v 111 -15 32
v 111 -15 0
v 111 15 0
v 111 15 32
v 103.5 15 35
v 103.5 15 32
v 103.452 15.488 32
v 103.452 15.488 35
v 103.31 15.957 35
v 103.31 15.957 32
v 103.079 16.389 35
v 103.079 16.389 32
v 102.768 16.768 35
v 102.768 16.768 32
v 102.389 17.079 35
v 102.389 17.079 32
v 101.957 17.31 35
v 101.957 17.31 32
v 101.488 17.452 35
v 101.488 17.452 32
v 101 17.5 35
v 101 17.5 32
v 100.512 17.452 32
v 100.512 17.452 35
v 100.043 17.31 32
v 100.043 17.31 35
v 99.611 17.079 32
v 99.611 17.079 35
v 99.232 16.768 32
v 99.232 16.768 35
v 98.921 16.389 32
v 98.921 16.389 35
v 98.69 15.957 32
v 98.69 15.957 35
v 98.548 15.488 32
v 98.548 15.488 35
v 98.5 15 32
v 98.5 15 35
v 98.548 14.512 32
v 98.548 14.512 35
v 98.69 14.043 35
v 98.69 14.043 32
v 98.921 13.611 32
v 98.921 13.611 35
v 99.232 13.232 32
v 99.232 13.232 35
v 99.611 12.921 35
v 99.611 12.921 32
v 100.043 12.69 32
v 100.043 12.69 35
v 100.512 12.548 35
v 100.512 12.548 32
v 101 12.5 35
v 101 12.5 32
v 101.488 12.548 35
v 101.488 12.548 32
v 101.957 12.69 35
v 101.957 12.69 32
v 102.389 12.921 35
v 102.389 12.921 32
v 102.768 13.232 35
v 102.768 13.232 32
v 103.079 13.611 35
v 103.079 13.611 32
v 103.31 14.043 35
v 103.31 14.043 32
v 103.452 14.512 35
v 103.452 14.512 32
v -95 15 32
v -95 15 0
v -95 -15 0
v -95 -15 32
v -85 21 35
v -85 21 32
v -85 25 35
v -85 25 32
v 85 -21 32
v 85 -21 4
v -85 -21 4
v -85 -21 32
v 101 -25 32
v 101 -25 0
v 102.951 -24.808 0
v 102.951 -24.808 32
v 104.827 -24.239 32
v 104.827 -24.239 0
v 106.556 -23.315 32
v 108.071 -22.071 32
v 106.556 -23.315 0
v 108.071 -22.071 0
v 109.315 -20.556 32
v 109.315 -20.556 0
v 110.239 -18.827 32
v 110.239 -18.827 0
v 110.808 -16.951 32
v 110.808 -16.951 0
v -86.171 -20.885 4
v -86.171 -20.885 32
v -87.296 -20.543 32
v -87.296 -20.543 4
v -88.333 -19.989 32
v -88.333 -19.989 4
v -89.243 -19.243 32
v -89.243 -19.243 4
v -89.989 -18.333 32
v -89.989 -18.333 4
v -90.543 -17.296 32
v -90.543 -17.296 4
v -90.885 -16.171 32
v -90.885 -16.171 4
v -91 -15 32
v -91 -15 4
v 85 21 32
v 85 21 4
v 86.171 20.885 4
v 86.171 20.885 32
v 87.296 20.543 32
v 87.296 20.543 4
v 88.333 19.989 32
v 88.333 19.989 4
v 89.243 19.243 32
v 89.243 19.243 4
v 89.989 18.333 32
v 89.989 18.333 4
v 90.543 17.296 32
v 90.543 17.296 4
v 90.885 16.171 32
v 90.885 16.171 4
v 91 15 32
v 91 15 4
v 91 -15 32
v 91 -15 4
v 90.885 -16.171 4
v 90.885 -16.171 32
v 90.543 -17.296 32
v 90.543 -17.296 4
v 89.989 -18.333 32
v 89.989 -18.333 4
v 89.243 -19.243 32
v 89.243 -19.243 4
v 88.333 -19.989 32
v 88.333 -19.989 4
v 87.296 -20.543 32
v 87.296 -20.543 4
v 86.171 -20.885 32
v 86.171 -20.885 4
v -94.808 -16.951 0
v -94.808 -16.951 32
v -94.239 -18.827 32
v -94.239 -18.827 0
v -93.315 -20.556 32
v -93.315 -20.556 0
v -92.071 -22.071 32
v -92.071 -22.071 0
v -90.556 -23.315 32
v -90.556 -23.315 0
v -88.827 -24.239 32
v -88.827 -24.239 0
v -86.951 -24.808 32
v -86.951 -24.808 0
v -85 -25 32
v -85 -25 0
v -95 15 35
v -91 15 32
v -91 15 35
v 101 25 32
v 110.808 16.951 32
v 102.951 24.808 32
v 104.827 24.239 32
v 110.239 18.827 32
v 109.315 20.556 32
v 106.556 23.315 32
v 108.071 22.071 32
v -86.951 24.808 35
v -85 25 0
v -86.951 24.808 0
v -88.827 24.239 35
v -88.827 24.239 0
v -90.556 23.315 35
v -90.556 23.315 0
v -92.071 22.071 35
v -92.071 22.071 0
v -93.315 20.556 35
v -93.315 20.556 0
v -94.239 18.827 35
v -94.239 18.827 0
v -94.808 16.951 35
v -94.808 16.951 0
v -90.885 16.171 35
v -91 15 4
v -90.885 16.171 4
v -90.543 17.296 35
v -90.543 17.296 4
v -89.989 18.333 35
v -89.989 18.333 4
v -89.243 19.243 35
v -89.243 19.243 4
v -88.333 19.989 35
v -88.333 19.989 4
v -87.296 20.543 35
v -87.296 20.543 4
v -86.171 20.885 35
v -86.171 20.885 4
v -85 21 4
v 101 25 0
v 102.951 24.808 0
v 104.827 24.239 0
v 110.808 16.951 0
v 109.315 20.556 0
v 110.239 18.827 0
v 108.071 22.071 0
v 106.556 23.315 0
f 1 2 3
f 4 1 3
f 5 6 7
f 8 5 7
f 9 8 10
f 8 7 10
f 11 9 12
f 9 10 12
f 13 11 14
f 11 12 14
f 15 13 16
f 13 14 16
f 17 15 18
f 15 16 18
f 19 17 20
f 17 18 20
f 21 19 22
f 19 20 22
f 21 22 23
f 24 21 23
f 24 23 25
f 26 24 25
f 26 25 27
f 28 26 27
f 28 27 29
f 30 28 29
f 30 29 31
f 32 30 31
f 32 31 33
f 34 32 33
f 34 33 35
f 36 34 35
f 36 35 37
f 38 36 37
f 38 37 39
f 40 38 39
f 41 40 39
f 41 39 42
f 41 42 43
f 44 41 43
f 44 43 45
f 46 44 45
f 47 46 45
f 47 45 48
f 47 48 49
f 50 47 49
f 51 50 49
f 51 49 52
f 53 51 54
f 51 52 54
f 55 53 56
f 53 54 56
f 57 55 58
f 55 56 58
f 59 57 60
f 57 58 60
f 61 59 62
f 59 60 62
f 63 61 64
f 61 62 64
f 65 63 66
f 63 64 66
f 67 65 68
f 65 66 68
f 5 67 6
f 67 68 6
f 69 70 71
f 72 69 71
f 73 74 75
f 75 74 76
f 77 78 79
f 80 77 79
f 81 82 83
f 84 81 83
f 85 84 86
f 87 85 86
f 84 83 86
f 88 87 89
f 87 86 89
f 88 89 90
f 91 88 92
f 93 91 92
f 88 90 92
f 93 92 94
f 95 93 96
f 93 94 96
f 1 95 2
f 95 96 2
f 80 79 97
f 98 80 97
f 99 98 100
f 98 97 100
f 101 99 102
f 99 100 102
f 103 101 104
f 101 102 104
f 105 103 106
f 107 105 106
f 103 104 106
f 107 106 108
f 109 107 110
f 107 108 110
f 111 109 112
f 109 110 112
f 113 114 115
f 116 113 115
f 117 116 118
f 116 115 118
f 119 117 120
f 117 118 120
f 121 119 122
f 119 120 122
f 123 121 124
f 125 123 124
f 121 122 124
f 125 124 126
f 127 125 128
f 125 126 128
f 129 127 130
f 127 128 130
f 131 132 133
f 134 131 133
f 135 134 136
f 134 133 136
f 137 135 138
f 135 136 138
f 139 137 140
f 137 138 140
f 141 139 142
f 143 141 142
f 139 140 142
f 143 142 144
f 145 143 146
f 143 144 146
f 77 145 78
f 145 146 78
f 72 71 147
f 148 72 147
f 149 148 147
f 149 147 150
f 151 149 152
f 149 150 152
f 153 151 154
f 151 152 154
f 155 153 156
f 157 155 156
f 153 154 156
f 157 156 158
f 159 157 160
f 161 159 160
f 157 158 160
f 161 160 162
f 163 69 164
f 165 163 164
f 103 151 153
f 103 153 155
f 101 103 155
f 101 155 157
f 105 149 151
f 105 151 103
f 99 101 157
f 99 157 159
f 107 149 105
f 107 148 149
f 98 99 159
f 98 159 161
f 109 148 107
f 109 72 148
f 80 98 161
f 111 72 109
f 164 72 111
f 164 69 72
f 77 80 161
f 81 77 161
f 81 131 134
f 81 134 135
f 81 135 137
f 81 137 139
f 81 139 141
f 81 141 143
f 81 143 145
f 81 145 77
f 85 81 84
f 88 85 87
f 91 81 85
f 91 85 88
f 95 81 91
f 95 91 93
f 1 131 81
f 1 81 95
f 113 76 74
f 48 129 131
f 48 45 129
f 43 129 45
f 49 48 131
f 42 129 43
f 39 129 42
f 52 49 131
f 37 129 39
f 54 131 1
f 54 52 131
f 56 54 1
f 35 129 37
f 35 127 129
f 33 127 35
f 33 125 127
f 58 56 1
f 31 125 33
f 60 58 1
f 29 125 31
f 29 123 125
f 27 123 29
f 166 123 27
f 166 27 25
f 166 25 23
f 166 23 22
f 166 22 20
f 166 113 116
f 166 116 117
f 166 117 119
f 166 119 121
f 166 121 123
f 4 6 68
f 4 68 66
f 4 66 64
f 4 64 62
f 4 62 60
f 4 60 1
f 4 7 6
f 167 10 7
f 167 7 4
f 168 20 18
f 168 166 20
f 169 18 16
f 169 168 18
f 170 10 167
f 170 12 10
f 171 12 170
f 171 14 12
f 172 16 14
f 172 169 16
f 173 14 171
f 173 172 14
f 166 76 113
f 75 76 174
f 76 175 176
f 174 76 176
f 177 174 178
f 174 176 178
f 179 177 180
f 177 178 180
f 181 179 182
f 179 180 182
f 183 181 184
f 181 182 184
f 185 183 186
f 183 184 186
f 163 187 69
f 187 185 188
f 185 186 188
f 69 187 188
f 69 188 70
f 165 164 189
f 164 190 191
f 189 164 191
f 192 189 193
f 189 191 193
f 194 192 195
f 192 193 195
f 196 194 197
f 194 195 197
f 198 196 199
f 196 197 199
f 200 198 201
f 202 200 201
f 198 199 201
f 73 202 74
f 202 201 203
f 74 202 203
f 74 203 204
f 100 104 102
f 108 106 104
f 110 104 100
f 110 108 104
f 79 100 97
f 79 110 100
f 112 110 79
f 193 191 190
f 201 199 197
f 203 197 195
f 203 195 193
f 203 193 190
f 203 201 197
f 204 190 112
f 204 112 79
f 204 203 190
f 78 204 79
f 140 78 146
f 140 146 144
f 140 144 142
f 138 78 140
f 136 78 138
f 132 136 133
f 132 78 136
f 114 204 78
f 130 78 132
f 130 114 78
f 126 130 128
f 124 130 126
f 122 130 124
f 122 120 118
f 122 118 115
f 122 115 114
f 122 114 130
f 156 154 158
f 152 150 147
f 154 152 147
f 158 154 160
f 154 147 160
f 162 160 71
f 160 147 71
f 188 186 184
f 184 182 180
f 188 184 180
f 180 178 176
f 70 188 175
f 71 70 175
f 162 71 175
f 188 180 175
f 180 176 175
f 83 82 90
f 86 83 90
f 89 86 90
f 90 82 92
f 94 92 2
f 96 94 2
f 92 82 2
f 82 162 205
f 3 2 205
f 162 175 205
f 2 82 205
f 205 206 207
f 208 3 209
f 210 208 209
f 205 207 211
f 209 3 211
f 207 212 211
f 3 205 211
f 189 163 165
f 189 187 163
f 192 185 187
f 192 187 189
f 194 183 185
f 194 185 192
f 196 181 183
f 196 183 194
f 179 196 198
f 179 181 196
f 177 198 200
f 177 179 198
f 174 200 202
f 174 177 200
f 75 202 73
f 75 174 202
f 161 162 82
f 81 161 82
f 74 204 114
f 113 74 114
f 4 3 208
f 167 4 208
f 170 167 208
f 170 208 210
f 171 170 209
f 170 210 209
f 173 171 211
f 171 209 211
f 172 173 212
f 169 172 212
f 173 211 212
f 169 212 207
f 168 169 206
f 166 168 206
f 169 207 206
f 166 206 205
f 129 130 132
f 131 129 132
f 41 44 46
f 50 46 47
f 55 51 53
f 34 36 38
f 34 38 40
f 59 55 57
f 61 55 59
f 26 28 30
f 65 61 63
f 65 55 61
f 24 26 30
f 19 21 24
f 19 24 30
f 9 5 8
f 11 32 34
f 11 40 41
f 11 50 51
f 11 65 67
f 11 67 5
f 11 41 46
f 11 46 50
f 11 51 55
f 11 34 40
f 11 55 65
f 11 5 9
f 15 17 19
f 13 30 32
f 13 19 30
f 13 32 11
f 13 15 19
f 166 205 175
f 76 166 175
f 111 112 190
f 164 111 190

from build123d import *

# Parameters (mm, degrees)
F0_R     = 2.5
F1_DEPTH = 32
F2_DEPTH = 35
F3_DEPTH = 4


with BuildPart() as f1:
    # F0 (on Top) → F1 (new body)
    with BuildSketch(Plane.XY):
        with BuildLine():
            Line((-95, 15), (-91, 15))
            ThreePointArc((-91, 15), (-89.242641, 19.242641), (-85, 21))
            Line((-85, 21), (-85, 25))
            ThreePointArc((-85, 25), (-92.071068, 22.071068), (-95, 15))
        make_face()
        with BuildLine():
            ThreePointArc((91, -15), (89.242641, -19.242641), (85, -21))
            Line((85, -21), (-85, -21))
            ThreePointArc((-85, -21), (-89.242641, -19.242641), (-91, -15))
            Line((-91, -15), (-91, 15))
            Line((-91, 15), (-95, 15))
            Line((-95, 15), (-95, -15))
            ThreePointArc((-95, -15), (-92.071068, -22.071068), (-85, -25))
            Line((-85, -25), (101, -25))
            ThreePointArc((101, -25), (108.071068, -22.071068), (111, -15))
            Line((111, -15), (111, 15))
            ThreePointArc((111, 15), (108.071068, 22.071068), (101, 25))
            Line((101, 25), (-85, 25))
            Line((-85, 25), (-85, 21))
            Line((-85, 21), (85, 21))
            ThreePointArc((85, 21), (89.242641, 19.242641), (91, 15))
            Line((91, 15), (91, -15))
        make_face()
        with Locations((101, 15)):
            Circle(F0_R, mode=Mode.SUBTRACT)
        with Locations((101, 15)):
            Circle(F0_R)
    extrude(amount=F1_DEPTH)

    # F0 (on Top) → F2 (join)
    with BuildSketch(Plane.XY):
        with BuildLine():
            Line((-95, 15), (-91, 15))
            ThreePointArc((-91, 15), (-89.242641, 19.242641), (-85, 21))
            Line((-85, 21), (-85, 25))
            ThreePointArc((-85, 25), (-92.071068, 22.071068), (-95, 15))
        make_face()
        with Locations((101, 15)):
            Circle(F0_R)
    extrude(amount=F2_DEPTH)

    # F0 (on Top) → F3 (join)
    with BuildSketch(Plane.XY):
        with BuildLine():
            Line((-85, -21), (85, -21))
            ThreePointArc((85, -21), (89.242641, -19.242641), (91, -15))
            Line((91, -15), (91, 15))
            ThreePointArc((91, 15), (89.242641, 19.242641), (85, 21))
            Line((85, 21), (-85, 21))
            ThreePointArc((-85, 21), (-89.242641, 19.242641), (-91, 15))
            Line((-91, 15), (-91, -15))
            ThreePointArc((-91, -15), (-89.242641, -19.242641), (-85, -21))
        make_face()
    extrude(amount=F3_DEPTH)


solid = f1.part
